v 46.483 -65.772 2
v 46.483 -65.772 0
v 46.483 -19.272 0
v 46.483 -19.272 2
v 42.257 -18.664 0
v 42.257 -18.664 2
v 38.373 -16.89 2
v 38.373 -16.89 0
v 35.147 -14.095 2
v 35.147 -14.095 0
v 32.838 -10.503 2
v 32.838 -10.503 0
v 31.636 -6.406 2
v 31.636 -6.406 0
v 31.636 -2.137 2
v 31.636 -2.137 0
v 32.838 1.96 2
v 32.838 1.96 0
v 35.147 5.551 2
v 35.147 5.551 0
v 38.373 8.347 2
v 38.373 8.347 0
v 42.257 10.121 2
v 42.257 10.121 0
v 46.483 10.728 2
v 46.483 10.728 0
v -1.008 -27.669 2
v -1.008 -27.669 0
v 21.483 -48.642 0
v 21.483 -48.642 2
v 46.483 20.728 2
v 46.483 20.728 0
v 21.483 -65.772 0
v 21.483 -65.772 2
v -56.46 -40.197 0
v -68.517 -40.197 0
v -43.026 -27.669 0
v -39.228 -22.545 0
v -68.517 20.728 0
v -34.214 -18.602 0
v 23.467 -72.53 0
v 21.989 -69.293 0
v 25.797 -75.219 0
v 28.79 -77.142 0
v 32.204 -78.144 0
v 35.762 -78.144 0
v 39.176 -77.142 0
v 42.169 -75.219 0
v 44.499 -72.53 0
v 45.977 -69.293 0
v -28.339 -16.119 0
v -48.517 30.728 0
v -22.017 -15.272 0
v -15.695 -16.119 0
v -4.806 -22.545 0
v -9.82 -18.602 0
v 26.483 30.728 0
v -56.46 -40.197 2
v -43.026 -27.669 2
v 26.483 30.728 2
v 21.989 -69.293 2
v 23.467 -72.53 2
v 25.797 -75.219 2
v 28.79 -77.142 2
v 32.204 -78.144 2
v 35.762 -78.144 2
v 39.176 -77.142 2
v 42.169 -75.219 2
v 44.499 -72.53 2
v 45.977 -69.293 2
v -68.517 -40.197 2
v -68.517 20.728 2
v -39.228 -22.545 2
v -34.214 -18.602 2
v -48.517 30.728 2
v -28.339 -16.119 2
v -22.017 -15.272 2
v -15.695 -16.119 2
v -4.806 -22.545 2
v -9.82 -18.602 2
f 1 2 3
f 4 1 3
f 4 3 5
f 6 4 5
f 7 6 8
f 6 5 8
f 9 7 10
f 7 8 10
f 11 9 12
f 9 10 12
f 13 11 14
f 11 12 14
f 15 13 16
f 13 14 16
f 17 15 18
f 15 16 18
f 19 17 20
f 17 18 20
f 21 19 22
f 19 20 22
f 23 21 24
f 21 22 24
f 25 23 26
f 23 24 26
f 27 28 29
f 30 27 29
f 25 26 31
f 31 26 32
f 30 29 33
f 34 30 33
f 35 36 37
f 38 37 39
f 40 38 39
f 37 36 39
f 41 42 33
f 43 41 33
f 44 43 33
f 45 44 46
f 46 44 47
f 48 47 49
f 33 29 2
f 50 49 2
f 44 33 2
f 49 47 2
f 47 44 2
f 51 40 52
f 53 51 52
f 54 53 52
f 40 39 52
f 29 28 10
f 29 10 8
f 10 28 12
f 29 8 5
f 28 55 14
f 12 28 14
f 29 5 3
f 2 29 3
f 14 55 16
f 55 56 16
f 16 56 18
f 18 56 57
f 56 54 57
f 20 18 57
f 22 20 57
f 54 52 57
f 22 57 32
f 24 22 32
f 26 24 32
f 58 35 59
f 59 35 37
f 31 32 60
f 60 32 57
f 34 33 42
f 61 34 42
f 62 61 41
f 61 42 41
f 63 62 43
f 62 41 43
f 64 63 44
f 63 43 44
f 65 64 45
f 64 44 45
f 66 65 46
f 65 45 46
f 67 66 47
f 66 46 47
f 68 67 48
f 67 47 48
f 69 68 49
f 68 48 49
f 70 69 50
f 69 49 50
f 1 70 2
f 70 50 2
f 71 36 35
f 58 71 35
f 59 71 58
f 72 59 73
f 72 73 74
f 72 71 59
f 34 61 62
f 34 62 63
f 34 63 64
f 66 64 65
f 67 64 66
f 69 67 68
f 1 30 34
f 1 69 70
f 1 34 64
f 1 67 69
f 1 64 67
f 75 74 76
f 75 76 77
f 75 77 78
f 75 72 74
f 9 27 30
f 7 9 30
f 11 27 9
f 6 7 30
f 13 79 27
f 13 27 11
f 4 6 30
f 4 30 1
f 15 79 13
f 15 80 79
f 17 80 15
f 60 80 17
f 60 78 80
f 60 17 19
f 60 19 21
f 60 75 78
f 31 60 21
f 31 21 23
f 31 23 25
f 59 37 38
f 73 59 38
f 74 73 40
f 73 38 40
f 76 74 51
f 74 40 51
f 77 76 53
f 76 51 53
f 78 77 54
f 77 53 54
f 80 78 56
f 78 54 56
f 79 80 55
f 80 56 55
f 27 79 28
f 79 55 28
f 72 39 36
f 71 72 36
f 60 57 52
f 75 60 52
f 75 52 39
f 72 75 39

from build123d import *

# Parameters (mm, degrees)
F1_DEPTH = 2


with BuildPart() as f1:
    # F0 (on Top) → F1 (new body)
    with BuildSketch(Plane.XY):
        with BuildLine():
            Line((26.482964, 30.72832), (-48.517036, 30.72832))
            Line((-48.517036, 30.72832), (-68.517036, 20.72832))
            Line((-68.517036, 20.72832), (-68.517036, -40.196751))
            Line((-68.517036, -40.196751), (-56.460455, -40.196751))
            Line((-56.460455, -40.196751), (-43.025967, -27.668888))
            ThreePointArc((-43.025967, -27.668888), (-22.017036, -15.27168), (-1.008104, -27.668888))
            Line((-1.008104, -27.668888), (21.482964, -48.642149))
            Line((21.482964, -48.642149), (21.482964, -65.77168))
            ThreePointArc((21.482964, -65.77168), (33.982964, -78.27168), (46.482964, -65.77168))
            Line((46.482964, -65.77168), (46.482964, -19.27168))
            ThreePointArc((46.482964, -19.27168), (31.482964, -4.27168), (46.482964, 10.72832))
            Line((46.482964, 10.72832), (46.482964, 20.72832))
            Line((46.482964, 20.72832), (26.482964, 30.72832))
        make_face()
    extrude(amount=F1_DEPTH)


solid = f1.part
